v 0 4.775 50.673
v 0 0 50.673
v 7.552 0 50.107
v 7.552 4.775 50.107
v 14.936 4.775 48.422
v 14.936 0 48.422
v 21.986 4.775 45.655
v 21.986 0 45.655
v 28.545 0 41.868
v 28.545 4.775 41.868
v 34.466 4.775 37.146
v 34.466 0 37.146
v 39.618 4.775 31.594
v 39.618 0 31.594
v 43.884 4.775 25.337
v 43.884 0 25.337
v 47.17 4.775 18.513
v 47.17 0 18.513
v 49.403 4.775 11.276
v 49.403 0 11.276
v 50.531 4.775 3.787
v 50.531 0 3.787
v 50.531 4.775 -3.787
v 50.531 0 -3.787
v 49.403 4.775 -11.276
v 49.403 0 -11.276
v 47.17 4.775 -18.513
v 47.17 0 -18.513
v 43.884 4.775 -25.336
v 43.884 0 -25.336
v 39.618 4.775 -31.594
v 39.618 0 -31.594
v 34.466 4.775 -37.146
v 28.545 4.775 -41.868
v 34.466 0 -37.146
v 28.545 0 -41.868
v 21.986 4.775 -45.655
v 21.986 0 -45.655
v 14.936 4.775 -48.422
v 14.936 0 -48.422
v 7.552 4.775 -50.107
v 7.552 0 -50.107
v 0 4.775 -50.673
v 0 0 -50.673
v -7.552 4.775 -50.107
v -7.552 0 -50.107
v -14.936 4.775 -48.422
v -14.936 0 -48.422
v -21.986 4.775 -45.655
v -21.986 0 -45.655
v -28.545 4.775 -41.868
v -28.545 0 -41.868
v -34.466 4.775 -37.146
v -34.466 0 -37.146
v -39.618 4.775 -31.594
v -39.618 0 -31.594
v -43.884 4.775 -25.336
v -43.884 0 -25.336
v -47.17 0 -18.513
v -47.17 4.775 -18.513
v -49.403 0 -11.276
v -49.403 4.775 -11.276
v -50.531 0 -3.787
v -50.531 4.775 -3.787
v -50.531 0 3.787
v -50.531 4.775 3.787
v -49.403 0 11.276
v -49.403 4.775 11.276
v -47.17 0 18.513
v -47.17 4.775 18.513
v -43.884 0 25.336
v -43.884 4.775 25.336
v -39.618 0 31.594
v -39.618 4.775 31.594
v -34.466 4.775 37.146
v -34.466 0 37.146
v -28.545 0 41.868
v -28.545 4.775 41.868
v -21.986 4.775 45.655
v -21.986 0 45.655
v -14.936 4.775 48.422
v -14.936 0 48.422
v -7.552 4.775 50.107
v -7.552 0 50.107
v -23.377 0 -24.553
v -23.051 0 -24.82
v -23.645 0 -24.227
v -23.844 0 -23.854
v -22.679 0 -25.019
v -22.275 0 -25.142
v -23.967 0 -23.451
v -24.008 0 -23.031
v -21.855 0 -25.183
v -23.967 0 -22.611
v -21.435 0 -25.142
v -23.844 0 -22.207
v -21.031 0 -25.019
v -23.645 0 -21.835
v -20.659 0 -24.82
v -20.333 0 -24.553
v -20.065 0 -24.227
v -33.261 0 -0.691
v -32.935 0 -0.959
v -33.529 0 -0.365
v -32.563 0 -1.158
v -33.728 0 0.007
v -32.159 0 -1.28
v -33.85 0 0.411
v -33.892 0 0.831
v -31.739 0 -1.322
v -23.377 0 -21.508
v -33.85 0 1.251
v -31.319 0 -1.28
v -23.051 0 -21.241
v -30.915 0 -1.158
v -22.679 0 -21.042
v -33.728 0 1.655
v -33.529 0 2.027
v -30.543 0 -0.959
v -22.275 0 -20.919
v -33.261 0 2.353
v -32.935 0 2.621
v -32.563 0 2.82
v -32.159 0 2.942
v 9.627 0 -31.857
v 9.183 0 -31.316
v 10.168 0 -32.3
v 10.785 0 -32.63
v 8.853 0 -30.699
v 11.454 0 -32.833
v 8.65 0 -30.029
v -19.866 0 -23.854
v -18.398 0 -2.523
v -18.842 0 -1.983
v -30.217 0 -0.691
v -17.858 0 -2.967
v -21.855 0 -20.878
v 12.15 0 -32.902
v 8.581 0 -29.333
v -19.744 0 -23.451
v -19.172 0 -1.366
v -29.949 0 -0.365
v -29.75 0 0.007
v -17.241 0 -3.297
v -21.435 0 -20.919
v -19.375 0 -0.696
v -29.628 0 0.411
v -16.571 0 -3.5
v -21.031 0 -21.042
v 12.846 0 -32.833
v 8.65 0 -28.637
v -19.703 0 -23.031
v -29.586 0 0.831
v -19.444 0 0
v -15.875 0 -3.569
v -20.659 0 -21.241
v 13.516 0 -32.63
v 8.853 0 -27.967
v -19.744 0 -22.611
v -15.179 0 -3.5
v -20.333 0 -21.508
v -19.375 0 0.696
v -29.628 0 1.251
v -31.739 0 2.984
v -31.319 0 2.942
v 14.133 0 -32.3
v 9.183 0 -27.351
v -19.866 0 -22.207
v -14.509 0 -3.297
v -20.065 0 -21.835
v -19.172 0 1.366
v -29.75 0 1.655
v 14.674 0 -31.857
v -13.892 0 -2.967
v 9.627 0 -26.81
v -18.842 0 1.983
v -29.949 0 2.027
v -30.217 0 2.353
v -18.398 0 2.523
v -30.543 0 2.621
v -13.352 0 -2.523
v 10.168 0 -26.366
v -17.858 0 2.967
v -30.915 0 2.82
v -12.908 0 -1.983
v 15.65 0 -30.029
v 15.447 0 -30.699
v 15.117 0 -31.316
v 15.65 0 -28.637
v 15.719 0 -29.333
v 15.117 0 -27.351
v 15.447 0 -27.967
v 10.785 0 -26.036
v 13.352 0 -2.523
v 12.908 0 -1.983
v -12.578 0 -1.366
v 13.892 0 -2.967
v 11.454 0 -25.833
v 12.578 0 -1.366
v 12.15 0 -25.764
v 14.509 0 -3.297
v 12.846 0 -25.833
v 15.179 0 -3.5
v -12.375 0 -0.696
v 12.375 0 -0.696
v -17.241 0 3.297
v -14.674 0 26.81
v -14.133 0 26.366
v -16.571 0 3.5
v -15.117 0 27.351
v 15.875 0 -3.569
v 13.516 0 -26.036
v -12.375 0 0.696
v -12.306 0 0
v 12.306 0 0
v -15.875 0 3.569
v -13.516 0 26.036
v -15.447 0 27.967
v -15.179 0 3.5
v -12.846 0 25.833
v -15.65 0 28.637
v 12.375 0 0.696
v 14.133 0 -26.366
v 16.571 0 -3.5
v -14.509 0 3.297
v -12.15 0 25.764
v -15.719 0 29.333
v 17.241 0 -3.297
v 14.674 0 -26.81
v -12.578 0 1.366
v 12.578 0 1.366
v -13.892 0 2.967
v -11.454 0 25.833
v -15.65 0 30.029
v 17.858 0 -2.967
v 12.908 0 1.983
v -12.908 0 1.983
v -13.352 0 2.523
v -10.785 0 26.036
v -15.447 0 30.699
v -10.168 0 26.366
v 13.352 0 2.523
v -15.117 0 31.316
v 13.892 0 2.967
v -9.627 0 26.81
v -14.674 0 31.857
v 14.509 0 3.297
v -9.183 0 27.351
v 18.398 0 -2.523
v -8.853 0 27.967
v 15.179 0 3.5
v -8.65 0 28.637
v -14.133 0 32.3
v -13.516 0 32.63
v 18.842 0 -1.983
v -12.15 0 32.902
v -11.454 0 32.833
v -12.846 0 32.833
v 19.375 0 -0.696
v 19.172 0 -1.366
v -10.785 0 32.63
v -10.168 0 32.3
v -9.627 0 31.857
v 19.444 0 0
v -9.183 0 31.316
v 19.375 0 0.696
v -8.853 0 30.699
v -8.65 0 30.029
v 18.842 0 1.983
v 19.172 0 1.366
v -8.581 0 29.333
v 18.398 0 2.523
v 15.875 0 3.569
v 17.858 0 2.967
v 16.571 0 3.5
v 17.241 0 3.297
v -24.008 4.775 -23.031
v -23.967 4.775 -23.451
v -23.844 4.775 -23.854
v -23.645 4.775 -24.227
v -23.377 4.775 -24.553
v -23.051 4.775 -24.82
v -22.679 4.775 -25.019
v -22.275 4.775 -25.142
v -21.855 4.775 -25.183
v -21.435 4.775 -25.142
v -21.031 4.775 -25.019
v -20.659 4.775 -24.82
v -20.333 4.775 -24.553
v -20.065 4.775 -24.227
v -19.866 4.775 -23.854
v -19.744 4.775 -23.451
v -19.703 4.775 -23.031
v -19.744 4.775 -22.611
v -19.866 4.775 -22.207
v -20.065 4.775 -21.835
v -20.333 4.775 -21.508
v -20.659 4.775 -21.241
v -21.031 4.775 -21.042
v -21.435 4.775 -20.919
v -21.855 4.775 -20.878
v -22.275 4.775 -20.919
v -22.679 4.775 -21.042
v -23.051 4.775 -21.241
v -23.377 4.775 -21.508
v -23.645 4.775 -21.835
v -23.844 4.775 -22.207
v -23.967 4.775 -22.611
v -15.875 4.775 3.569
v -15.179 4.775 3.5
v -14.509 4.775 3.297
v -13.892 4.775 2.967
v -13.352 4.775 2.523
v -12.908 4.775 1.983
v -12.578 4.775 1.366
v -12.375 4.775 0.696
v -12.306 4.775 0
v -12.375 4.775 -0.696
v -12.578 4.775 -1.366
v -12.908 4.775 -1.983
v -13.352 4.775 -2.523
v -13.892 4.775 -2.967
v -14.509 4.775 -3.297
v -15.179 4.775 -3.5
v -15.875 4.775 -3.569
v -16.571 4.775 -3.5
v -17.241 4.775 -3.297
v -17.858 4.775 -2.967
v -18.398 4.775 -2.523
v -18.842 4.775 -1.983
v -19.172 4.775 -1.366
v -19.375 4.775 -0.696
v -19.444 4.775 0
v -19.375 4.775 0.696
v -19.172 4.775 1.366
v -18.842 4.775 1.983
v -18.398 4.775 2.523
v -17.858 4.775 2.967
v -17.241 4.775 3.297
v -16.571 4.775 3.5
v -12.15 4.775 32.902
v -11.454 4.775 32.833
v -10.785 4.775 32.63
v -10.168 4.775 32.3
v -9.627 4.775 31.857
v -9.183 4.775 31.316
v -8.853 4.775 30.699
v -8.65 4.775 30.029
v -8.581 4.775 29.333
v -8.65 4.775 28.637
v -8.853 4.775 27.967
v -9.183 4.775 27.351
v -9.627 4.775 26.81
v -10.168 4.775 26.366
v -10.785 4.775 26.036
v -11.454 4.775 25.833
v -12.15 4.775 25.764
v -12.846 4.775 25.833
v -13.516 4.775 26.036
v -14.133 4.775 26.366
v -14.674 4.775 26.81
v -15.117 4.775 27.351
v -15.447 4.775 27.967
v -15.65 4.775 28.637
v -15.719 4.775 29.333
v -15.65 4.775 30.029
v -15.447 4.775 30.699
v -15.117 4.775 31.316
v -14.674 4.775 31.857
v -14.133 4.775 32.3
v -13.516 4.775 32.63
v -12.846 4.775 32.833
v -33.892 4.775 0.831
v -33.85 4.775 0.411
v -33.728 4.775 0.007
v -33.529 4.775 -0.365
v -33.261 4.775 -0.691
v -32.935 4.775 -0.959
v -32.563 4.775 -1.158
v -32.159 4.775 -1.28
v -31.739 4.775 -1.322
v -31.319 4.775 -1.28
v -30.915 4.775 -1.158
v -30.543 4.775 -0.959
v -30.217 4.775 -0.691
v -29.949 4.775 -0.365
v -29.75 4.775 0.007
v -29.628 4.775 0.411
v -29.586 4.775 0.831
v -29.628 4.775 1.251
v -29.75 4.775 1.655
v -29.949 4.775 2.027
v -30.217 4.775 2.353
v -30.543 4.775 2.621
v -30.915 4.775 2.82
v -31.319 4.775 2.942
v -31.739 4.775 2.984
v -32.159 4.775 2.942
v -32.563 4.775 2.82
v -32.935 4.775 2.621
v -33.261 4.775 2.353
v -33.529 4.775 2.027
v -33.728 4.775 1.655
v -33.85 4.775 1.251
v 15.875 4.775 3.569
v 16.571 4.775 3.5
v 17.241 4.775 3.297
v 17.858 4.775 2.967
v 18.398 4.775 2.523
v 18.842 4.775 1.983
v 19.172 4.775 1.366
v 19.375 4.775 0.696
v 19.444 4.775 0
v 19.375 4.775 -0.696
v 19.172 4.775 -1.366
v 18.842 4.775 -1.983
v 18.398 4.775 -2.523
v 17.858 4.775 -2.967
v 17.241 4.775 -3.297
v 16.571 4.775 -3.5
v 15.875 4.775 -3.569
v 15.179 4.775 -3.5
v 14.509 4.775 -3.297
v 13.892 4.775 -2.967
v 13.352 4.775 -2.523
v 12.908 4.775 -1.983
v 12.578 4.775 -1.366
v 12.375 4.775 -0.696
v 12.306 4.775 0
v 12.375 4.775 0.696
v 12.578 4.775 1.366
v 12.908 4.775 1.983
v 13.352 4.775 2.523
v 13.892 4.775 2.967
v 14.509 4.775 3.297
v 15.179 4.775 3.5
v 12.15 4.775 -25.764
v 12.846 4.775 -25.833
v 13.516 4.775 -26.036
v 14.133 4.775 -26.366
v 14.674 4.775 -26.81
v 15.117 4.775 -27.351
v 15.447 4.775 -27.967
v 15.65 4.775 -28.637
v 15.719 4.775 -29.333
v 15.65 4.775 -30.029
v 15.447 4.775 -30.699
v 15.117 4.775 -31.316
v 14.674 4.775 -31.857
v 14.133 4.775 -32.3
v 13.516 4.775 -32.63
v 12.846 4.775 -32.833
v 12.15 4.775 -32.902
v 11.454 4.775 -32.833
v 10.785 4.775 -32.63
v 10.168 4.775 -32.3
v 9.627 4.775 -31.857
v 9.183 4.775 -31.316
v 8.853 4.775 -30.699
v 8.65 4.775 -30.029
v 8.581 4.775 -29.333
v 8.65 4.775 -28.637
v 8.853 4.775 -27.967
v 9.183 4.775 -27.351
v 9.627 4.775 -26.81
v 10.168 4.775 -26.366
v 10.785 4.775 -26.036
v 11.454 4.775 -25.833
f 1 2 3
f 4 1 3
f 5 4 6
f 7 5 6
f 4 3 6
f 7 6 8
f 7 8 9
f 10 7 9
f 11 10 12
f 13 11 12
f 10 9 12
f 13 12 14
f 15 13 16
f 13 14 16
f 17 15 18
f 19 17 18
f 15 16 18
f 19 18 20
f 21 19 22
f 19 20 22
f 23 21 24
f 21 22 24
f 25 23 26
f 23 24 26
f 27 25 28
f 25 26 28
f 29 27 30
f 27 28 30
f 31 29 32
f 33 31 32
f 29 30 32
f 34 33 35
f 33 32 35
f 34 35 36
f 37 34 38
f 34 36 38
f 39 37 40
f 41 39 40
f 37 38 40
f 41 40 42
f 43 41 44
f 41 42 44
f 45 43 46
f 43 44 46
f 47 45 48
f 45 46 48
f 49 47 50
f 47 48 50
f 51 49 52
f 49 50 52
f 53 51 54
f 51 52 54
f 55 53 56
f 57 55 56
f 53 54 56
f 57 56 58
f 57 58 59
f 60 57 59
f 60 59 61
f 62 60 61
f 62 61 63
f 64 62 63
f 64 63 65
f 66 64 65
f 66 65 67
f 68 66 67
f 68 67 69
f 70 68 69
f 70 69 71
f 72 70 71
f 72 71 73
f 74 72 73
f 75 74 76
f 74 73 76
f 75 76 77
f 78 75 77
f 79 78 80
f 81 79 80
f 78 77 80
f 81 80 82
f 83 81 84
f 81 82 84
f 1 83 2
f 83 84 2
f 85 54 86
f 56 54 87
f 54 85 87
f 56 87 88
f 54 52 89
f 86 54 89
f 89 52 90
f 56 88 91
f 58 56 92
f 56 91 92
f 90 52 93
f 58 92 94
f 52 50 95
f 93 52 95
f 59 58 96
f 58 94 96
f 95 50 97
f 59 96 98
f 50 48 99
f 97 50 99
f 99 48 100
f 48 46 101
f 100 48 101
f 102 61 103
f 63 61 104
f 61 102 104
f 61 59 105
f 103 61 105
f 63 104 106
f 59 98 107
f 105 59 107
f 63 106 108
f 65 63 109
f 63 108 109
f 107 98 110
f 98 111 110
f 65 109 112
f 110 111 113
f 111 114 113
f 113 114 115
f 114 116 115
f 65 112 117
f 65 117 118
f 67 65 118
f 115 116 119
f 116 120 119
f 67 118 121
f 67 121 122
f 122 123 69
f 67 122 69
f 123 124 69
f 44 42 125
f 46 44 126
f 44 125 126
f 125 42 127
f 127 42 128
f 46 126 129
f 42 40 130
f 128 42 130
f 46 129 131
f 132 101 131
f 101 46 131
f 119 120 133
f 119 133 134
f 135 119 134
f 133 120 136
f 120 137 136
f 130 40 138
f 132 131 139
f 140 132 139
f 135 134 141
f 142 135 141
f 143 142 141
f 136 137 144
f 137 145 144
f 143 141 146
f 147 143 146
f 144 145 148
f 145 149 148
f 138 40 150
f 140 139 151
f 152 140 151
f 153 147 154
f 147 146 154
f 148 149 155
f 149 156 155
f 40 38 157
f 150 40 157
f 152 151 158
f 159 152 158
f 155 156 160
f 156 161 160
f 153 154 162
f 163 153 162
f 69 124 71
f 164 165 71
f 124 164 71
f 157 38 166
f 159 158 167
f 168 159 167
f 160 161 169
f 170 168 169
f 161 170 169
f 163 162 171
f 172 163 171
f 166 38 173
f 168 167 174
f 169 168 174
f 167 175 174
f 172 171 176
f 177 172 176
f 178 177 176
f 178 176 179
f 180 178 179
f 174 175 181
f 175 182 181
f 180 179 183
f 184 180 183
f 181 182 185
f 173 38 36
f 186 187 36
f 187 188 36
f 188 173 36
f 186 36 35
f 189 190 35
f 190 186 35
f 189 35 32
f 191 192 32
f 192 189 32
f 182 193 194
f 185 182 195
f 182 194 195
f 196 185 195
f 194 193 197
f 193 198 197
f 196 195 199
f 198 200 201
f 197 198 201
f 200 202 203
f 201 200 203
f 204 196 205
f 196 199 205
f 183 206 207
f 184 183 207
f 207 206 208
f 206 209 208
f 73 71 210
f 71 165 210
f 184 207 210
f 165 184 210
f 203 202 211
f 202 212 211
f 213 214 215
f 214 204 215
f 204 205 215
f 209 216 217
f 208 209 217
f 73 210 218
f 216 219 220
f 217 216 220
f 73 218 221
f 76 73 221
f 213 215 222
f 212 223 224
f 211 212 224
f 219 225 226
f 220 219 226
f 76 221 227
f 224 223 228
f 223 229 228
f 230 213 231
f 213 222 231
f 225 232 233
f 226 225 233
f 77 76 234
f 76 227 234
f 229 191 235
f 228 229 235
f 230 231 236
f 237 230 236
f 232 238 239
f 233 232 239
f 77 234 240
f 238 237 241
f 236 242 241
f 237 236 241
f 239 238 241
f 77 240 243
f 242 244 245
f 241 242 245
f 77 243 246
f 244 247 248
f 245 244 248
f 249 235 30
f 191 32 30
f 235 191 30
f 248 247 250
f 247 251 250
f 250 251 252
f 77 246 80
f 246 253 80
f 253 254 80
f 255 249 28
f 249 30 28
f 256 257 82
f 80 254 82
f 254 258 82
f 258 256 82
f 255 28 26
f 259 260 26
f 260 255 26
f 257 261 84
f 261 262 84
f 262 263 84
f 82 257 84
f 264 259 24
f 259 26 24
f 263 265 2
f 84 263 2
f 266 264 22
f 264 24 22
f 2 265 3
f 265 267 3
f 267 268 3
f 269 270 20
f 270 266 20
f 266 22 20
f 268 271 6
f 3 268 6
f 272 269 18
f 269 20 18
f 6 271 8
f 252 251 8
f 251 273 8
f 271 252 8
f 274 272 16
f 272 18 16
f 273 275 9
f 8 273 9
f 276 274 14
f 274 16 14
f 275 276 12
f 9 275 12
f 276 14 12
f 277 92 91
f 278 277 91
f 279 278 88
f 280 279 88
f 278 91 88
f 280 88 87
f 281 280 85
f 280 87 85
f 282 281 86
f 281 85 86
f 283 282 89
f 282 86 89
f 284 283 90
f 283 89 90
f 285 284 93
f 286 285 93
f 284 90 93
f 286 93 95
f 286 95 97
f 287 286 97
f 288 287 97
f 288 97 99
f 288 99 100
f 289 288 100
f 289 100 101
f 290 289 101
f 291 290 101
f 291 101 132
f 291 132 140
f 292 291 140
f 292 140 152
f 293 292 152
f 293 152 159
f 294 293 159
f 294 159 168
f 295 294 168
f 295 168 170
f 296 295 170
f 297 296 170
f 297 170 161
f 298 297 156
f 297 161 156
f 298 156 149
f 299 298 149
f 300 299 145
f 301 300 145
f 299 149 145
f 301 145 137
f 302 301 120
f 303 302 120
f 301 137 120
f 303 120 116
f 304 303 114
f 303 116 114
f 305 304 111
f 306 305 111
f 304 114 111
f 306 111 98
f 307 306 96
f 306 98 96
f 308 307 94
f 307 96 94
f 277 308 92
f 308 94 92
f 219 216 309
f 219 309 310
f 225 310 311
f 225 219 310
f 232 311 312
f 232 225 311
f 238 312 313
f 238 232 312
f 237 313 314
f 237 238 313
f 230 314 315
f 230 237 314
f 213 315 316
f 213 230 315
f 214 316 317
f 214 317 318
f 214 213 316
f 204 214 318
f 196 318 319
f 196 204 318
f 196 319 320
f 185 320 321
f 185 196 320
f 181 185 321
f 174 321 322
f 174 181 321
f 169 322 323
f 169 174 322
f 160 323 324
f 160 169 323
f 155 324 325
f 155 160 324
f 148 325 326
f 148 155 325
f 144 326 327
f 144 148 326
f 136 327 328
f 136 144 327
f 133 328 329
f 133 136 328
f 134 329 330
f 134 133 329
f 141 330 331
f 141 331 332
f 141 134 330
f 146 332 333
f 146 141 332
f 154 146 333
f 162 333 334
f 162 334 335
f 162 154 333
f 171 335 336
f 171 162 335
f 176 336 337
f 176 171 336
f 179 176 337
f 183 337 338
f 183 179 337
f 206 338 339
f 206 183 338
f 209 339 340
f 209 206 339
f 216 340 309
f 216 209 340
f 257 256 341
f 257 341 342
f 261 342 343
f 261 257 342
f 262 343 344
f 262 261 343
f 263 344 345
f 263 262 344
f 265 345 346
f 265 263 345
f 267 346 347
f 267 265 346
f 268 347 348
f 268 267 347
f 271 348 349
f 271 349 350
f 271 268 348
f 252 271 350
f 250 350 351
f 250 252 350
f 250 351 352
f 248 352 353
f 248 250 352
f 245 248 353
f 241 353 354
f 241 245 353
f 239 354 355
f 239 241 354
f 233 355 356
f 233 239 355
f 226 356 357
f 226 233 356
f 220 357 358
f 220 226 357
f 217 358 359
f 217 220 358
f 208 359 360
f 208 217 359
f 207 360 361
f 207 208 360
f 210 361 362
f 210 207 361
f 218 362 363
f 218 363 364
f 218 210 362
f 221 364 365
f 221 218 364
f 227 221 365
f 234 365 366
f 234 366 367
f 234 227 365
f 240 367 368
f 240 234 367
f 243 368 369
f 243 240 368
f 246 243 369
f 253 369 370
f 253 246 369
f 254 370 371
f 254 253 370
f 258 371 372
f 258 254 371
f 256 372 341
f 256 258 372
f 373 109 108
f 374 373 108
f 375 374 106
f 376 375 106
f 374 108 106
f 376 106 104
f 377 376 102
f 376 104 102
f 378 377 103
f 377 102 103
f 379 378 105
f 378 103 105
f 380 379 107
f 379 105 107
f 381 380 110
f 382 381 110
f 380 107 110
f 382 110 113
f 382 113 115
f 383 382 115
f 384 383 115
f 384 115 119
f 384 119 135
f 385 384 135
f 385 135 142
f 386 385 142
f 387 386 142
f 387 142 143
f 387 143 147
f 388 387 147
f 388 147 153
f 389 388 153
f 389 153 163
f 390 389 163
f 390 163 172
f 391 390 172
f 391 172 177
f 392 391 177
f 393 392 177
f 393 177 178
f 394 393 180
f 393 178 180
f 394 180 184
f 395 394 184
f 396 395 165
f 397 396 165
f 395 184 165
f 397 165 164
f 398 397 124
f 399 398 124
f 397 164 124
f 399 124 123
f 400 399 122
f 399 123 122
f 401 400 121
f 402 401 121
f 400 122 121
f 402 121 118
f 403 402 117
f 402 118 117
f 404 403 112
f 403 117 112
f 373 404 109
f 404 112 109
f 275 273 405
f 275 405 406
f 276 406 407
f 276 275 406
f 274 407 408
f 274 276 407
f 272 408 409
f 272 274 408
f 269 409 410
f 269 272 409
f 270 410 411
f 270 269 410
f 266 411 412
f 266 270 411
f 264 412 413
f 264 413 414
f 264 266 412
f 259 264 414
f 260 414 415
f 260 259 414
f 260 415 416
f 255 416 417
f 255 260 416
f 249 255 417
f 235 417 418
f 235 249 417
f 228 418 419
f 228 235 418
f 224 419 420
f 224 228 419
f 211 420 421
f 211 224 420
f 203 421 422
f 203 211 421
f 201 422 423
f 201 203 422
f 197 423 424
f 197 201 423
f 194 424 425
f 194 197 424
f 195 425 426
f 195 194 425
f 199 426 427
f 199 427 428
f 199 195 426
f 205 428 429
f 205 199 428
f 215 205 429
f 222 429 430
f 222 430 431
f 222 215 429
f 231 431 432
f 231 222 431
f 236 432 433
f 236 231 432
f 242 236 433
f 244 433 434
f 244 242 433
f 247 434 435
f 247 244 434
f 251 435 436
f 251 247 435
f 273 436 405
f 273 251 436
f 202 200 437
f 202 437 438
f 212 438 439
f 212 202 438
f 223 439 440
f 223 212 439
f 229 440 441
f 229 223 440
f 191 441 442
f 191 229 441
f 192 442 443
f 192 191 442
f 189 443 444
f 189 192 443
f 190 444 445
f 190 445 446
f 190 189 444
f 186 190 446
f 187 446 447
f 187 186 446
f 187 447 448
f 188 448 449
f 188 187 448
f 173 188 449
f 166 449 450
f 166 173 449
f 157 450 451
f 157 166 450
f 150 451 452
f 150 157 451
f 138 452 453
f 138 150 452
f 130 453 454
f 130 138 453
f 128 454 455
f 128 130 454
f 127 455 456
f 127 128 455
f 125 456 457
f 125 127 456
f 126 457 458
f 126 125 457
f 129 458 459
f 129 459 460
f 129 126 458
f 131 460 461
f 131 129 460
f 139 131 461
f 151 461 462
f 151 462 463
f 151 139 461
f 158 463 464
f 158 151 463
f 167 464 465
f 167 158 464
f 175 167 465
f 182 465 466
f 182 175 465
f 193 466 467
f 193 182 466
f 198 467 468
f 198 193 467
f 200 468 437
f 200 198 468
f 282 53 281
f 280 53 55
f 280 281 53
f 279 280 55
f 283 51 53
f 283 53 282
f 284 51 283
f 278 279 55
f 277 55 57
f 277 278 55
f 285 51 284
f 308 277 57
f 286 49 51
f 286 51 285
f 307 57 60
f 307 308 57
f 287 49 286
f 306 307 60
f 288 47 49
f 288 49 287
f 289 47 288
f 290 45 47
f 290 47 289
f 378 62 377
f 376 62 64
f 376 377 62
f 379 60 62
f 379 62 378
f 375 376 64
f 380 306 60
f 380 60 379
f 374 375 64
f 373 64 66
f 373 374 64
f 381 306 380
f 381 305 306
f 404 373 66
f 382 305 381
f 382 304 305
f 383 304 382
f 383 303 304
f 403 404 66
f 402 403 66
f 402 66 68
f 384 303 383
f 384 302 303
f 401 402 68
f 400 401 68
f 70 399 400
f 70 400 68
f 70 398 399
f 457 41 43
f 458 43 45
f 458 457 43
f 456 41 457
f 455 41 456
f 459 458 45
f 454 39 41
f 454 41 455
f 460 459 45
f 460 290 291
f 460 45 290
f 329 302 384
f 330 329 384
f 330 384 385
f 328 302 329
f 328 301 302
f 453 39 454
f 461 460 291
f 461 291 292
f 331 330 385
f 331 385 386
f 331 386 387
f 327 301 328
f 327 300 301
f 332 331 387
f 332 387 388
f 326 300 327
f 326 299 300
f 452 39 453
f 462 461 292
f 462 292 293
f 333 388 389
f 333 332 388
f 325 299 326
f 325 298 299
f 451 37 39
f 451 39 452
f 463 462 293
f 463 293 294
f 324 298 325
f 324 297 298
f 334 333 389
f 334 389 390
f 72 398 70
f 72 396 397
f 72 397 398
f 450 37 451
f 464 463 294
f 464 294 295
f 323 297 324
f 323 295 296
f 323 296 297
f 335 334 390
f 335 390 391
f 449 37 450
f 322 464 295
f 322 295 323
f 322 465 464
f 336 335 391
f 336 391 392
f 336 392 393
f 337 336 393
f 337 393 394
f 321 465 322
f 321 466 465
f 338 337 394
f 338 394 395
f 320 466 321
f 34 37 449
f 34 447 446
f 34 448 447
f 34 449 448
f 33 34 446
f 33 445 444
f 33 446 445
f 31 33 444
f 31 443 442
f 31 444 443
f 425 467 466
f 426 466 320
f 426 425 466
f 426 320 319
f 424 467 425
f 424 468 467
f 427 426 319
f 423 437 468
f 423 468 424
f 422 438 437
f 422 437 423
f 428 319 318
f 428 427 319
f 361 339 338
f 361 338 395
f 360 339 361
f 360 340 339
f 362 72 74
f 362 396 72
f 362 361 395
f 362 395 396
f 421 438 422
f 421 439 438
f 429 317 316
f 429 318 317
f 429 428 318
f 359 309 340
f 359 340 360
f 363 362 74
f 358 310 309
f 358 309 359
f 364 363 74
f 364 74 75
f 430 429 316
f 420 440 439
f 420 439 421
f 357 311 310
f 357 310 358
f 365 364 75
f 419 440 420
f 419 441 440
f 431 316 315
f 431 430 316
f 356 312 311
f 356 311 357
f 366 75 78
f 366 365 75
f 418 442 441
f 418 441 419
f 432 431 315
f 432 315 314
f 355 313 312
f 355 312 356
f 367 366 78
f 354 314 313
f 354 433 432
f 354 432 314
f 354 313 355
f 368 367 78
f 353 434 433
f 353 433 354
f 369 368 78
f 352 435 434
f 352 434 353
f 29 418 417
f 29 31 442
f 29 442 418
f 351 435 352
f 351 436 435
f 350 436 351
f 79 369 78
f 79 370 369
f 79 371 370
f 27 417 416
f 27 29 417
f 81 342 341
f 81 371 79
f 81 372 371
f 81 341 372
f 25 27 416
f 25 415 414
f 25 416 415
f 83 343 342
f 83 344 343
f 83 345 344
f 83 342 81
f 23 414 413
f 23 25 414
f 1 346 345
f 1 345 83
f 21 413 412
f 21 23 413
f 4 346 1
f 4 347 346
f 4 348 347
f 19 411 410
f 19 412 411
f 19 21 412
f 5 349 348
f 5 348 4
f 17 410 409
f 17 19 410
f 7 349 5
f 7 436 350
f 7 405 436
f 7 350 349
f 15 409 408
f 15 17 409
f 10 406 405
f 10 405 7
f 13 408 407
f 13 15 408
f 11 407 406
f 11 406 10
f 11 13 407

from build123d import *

# Parameters (mm, degrees)
SKETCH1_R                 = 50.673
SKETCH1_R_2               = 3.5687
BOSS_EXTRUDE1_DEPTH       = 4.7752
F_6_CLEARANCE_HOLE1_D     = 4.3053
F_6_CLEARANCE_HOLE1_DEPTH = 10.668
F_6_CLEARANCE_HOLE1_TIP   = 1.293442612


with BuildPart() as part:
    # Sketch1 → Boss-Extrude1 (new body)
    with BuildSketch(Plane(origin=(0, 0, 0), x_dir=(1, 0, 0), z_dir=(0, 1, 0))):
        with Locations(Location((0, 0, 0), (0, 0, 270))):
            Circle(SKETCH1_R)
        with Locations(Location((12.150198978, 29.333175157, 0), (0, 0, 270))):
            Circle(SKETCH1_R_2, mode=Mode.SUBTRACT)
        with Locations(Location((-12.150198978, -29.333175157, 0), (0, 0, 270))):
            Circle(SKETCH1_R_2, mode=Mode.SUBTRACT)
        with Locations(Location((-15.875, 0, 0), (0, 0, 270))):
            Circle(SKETCH1_R_2, mode=Mode.SUBTRACT)
        with Locations(Location((15.875, 0, 0), (0, 0, 270))):
            Circle(SKETCH1_R_2, mode=Mode.SUBTRACT)
    extrude(amount=BOSS_EXTRUDE1_DEPTH)

    # #6 Clearance Hole1
    with Locations(Plane(origin=(0, 4.7752, 0), x_dir=(1, 0, 0), z_dir=(0, 1, 0))):
        with Locations((-21.855257778, 23.03063628), (-31.739120068, -0.831118109)):
            Hole(F_6_CLEARANCE_HOLE1_D / 2, depth=F_6_CLEARANCE_HOLE1_DEPTH)
            with Locations((0, 0, -(F_6_CLEARANCE_HOLE1_DEPTH + F_6_CLEARANCE_HOLE1_TIP / 2))):  # 118° drill point
                Cone(0, F_6_CLEARANCE_HOLE1_D / 2, F_6_CLEARANCE_HOLE1_TIP, mode=Mode.SUBTRACT)


solid = part.part
